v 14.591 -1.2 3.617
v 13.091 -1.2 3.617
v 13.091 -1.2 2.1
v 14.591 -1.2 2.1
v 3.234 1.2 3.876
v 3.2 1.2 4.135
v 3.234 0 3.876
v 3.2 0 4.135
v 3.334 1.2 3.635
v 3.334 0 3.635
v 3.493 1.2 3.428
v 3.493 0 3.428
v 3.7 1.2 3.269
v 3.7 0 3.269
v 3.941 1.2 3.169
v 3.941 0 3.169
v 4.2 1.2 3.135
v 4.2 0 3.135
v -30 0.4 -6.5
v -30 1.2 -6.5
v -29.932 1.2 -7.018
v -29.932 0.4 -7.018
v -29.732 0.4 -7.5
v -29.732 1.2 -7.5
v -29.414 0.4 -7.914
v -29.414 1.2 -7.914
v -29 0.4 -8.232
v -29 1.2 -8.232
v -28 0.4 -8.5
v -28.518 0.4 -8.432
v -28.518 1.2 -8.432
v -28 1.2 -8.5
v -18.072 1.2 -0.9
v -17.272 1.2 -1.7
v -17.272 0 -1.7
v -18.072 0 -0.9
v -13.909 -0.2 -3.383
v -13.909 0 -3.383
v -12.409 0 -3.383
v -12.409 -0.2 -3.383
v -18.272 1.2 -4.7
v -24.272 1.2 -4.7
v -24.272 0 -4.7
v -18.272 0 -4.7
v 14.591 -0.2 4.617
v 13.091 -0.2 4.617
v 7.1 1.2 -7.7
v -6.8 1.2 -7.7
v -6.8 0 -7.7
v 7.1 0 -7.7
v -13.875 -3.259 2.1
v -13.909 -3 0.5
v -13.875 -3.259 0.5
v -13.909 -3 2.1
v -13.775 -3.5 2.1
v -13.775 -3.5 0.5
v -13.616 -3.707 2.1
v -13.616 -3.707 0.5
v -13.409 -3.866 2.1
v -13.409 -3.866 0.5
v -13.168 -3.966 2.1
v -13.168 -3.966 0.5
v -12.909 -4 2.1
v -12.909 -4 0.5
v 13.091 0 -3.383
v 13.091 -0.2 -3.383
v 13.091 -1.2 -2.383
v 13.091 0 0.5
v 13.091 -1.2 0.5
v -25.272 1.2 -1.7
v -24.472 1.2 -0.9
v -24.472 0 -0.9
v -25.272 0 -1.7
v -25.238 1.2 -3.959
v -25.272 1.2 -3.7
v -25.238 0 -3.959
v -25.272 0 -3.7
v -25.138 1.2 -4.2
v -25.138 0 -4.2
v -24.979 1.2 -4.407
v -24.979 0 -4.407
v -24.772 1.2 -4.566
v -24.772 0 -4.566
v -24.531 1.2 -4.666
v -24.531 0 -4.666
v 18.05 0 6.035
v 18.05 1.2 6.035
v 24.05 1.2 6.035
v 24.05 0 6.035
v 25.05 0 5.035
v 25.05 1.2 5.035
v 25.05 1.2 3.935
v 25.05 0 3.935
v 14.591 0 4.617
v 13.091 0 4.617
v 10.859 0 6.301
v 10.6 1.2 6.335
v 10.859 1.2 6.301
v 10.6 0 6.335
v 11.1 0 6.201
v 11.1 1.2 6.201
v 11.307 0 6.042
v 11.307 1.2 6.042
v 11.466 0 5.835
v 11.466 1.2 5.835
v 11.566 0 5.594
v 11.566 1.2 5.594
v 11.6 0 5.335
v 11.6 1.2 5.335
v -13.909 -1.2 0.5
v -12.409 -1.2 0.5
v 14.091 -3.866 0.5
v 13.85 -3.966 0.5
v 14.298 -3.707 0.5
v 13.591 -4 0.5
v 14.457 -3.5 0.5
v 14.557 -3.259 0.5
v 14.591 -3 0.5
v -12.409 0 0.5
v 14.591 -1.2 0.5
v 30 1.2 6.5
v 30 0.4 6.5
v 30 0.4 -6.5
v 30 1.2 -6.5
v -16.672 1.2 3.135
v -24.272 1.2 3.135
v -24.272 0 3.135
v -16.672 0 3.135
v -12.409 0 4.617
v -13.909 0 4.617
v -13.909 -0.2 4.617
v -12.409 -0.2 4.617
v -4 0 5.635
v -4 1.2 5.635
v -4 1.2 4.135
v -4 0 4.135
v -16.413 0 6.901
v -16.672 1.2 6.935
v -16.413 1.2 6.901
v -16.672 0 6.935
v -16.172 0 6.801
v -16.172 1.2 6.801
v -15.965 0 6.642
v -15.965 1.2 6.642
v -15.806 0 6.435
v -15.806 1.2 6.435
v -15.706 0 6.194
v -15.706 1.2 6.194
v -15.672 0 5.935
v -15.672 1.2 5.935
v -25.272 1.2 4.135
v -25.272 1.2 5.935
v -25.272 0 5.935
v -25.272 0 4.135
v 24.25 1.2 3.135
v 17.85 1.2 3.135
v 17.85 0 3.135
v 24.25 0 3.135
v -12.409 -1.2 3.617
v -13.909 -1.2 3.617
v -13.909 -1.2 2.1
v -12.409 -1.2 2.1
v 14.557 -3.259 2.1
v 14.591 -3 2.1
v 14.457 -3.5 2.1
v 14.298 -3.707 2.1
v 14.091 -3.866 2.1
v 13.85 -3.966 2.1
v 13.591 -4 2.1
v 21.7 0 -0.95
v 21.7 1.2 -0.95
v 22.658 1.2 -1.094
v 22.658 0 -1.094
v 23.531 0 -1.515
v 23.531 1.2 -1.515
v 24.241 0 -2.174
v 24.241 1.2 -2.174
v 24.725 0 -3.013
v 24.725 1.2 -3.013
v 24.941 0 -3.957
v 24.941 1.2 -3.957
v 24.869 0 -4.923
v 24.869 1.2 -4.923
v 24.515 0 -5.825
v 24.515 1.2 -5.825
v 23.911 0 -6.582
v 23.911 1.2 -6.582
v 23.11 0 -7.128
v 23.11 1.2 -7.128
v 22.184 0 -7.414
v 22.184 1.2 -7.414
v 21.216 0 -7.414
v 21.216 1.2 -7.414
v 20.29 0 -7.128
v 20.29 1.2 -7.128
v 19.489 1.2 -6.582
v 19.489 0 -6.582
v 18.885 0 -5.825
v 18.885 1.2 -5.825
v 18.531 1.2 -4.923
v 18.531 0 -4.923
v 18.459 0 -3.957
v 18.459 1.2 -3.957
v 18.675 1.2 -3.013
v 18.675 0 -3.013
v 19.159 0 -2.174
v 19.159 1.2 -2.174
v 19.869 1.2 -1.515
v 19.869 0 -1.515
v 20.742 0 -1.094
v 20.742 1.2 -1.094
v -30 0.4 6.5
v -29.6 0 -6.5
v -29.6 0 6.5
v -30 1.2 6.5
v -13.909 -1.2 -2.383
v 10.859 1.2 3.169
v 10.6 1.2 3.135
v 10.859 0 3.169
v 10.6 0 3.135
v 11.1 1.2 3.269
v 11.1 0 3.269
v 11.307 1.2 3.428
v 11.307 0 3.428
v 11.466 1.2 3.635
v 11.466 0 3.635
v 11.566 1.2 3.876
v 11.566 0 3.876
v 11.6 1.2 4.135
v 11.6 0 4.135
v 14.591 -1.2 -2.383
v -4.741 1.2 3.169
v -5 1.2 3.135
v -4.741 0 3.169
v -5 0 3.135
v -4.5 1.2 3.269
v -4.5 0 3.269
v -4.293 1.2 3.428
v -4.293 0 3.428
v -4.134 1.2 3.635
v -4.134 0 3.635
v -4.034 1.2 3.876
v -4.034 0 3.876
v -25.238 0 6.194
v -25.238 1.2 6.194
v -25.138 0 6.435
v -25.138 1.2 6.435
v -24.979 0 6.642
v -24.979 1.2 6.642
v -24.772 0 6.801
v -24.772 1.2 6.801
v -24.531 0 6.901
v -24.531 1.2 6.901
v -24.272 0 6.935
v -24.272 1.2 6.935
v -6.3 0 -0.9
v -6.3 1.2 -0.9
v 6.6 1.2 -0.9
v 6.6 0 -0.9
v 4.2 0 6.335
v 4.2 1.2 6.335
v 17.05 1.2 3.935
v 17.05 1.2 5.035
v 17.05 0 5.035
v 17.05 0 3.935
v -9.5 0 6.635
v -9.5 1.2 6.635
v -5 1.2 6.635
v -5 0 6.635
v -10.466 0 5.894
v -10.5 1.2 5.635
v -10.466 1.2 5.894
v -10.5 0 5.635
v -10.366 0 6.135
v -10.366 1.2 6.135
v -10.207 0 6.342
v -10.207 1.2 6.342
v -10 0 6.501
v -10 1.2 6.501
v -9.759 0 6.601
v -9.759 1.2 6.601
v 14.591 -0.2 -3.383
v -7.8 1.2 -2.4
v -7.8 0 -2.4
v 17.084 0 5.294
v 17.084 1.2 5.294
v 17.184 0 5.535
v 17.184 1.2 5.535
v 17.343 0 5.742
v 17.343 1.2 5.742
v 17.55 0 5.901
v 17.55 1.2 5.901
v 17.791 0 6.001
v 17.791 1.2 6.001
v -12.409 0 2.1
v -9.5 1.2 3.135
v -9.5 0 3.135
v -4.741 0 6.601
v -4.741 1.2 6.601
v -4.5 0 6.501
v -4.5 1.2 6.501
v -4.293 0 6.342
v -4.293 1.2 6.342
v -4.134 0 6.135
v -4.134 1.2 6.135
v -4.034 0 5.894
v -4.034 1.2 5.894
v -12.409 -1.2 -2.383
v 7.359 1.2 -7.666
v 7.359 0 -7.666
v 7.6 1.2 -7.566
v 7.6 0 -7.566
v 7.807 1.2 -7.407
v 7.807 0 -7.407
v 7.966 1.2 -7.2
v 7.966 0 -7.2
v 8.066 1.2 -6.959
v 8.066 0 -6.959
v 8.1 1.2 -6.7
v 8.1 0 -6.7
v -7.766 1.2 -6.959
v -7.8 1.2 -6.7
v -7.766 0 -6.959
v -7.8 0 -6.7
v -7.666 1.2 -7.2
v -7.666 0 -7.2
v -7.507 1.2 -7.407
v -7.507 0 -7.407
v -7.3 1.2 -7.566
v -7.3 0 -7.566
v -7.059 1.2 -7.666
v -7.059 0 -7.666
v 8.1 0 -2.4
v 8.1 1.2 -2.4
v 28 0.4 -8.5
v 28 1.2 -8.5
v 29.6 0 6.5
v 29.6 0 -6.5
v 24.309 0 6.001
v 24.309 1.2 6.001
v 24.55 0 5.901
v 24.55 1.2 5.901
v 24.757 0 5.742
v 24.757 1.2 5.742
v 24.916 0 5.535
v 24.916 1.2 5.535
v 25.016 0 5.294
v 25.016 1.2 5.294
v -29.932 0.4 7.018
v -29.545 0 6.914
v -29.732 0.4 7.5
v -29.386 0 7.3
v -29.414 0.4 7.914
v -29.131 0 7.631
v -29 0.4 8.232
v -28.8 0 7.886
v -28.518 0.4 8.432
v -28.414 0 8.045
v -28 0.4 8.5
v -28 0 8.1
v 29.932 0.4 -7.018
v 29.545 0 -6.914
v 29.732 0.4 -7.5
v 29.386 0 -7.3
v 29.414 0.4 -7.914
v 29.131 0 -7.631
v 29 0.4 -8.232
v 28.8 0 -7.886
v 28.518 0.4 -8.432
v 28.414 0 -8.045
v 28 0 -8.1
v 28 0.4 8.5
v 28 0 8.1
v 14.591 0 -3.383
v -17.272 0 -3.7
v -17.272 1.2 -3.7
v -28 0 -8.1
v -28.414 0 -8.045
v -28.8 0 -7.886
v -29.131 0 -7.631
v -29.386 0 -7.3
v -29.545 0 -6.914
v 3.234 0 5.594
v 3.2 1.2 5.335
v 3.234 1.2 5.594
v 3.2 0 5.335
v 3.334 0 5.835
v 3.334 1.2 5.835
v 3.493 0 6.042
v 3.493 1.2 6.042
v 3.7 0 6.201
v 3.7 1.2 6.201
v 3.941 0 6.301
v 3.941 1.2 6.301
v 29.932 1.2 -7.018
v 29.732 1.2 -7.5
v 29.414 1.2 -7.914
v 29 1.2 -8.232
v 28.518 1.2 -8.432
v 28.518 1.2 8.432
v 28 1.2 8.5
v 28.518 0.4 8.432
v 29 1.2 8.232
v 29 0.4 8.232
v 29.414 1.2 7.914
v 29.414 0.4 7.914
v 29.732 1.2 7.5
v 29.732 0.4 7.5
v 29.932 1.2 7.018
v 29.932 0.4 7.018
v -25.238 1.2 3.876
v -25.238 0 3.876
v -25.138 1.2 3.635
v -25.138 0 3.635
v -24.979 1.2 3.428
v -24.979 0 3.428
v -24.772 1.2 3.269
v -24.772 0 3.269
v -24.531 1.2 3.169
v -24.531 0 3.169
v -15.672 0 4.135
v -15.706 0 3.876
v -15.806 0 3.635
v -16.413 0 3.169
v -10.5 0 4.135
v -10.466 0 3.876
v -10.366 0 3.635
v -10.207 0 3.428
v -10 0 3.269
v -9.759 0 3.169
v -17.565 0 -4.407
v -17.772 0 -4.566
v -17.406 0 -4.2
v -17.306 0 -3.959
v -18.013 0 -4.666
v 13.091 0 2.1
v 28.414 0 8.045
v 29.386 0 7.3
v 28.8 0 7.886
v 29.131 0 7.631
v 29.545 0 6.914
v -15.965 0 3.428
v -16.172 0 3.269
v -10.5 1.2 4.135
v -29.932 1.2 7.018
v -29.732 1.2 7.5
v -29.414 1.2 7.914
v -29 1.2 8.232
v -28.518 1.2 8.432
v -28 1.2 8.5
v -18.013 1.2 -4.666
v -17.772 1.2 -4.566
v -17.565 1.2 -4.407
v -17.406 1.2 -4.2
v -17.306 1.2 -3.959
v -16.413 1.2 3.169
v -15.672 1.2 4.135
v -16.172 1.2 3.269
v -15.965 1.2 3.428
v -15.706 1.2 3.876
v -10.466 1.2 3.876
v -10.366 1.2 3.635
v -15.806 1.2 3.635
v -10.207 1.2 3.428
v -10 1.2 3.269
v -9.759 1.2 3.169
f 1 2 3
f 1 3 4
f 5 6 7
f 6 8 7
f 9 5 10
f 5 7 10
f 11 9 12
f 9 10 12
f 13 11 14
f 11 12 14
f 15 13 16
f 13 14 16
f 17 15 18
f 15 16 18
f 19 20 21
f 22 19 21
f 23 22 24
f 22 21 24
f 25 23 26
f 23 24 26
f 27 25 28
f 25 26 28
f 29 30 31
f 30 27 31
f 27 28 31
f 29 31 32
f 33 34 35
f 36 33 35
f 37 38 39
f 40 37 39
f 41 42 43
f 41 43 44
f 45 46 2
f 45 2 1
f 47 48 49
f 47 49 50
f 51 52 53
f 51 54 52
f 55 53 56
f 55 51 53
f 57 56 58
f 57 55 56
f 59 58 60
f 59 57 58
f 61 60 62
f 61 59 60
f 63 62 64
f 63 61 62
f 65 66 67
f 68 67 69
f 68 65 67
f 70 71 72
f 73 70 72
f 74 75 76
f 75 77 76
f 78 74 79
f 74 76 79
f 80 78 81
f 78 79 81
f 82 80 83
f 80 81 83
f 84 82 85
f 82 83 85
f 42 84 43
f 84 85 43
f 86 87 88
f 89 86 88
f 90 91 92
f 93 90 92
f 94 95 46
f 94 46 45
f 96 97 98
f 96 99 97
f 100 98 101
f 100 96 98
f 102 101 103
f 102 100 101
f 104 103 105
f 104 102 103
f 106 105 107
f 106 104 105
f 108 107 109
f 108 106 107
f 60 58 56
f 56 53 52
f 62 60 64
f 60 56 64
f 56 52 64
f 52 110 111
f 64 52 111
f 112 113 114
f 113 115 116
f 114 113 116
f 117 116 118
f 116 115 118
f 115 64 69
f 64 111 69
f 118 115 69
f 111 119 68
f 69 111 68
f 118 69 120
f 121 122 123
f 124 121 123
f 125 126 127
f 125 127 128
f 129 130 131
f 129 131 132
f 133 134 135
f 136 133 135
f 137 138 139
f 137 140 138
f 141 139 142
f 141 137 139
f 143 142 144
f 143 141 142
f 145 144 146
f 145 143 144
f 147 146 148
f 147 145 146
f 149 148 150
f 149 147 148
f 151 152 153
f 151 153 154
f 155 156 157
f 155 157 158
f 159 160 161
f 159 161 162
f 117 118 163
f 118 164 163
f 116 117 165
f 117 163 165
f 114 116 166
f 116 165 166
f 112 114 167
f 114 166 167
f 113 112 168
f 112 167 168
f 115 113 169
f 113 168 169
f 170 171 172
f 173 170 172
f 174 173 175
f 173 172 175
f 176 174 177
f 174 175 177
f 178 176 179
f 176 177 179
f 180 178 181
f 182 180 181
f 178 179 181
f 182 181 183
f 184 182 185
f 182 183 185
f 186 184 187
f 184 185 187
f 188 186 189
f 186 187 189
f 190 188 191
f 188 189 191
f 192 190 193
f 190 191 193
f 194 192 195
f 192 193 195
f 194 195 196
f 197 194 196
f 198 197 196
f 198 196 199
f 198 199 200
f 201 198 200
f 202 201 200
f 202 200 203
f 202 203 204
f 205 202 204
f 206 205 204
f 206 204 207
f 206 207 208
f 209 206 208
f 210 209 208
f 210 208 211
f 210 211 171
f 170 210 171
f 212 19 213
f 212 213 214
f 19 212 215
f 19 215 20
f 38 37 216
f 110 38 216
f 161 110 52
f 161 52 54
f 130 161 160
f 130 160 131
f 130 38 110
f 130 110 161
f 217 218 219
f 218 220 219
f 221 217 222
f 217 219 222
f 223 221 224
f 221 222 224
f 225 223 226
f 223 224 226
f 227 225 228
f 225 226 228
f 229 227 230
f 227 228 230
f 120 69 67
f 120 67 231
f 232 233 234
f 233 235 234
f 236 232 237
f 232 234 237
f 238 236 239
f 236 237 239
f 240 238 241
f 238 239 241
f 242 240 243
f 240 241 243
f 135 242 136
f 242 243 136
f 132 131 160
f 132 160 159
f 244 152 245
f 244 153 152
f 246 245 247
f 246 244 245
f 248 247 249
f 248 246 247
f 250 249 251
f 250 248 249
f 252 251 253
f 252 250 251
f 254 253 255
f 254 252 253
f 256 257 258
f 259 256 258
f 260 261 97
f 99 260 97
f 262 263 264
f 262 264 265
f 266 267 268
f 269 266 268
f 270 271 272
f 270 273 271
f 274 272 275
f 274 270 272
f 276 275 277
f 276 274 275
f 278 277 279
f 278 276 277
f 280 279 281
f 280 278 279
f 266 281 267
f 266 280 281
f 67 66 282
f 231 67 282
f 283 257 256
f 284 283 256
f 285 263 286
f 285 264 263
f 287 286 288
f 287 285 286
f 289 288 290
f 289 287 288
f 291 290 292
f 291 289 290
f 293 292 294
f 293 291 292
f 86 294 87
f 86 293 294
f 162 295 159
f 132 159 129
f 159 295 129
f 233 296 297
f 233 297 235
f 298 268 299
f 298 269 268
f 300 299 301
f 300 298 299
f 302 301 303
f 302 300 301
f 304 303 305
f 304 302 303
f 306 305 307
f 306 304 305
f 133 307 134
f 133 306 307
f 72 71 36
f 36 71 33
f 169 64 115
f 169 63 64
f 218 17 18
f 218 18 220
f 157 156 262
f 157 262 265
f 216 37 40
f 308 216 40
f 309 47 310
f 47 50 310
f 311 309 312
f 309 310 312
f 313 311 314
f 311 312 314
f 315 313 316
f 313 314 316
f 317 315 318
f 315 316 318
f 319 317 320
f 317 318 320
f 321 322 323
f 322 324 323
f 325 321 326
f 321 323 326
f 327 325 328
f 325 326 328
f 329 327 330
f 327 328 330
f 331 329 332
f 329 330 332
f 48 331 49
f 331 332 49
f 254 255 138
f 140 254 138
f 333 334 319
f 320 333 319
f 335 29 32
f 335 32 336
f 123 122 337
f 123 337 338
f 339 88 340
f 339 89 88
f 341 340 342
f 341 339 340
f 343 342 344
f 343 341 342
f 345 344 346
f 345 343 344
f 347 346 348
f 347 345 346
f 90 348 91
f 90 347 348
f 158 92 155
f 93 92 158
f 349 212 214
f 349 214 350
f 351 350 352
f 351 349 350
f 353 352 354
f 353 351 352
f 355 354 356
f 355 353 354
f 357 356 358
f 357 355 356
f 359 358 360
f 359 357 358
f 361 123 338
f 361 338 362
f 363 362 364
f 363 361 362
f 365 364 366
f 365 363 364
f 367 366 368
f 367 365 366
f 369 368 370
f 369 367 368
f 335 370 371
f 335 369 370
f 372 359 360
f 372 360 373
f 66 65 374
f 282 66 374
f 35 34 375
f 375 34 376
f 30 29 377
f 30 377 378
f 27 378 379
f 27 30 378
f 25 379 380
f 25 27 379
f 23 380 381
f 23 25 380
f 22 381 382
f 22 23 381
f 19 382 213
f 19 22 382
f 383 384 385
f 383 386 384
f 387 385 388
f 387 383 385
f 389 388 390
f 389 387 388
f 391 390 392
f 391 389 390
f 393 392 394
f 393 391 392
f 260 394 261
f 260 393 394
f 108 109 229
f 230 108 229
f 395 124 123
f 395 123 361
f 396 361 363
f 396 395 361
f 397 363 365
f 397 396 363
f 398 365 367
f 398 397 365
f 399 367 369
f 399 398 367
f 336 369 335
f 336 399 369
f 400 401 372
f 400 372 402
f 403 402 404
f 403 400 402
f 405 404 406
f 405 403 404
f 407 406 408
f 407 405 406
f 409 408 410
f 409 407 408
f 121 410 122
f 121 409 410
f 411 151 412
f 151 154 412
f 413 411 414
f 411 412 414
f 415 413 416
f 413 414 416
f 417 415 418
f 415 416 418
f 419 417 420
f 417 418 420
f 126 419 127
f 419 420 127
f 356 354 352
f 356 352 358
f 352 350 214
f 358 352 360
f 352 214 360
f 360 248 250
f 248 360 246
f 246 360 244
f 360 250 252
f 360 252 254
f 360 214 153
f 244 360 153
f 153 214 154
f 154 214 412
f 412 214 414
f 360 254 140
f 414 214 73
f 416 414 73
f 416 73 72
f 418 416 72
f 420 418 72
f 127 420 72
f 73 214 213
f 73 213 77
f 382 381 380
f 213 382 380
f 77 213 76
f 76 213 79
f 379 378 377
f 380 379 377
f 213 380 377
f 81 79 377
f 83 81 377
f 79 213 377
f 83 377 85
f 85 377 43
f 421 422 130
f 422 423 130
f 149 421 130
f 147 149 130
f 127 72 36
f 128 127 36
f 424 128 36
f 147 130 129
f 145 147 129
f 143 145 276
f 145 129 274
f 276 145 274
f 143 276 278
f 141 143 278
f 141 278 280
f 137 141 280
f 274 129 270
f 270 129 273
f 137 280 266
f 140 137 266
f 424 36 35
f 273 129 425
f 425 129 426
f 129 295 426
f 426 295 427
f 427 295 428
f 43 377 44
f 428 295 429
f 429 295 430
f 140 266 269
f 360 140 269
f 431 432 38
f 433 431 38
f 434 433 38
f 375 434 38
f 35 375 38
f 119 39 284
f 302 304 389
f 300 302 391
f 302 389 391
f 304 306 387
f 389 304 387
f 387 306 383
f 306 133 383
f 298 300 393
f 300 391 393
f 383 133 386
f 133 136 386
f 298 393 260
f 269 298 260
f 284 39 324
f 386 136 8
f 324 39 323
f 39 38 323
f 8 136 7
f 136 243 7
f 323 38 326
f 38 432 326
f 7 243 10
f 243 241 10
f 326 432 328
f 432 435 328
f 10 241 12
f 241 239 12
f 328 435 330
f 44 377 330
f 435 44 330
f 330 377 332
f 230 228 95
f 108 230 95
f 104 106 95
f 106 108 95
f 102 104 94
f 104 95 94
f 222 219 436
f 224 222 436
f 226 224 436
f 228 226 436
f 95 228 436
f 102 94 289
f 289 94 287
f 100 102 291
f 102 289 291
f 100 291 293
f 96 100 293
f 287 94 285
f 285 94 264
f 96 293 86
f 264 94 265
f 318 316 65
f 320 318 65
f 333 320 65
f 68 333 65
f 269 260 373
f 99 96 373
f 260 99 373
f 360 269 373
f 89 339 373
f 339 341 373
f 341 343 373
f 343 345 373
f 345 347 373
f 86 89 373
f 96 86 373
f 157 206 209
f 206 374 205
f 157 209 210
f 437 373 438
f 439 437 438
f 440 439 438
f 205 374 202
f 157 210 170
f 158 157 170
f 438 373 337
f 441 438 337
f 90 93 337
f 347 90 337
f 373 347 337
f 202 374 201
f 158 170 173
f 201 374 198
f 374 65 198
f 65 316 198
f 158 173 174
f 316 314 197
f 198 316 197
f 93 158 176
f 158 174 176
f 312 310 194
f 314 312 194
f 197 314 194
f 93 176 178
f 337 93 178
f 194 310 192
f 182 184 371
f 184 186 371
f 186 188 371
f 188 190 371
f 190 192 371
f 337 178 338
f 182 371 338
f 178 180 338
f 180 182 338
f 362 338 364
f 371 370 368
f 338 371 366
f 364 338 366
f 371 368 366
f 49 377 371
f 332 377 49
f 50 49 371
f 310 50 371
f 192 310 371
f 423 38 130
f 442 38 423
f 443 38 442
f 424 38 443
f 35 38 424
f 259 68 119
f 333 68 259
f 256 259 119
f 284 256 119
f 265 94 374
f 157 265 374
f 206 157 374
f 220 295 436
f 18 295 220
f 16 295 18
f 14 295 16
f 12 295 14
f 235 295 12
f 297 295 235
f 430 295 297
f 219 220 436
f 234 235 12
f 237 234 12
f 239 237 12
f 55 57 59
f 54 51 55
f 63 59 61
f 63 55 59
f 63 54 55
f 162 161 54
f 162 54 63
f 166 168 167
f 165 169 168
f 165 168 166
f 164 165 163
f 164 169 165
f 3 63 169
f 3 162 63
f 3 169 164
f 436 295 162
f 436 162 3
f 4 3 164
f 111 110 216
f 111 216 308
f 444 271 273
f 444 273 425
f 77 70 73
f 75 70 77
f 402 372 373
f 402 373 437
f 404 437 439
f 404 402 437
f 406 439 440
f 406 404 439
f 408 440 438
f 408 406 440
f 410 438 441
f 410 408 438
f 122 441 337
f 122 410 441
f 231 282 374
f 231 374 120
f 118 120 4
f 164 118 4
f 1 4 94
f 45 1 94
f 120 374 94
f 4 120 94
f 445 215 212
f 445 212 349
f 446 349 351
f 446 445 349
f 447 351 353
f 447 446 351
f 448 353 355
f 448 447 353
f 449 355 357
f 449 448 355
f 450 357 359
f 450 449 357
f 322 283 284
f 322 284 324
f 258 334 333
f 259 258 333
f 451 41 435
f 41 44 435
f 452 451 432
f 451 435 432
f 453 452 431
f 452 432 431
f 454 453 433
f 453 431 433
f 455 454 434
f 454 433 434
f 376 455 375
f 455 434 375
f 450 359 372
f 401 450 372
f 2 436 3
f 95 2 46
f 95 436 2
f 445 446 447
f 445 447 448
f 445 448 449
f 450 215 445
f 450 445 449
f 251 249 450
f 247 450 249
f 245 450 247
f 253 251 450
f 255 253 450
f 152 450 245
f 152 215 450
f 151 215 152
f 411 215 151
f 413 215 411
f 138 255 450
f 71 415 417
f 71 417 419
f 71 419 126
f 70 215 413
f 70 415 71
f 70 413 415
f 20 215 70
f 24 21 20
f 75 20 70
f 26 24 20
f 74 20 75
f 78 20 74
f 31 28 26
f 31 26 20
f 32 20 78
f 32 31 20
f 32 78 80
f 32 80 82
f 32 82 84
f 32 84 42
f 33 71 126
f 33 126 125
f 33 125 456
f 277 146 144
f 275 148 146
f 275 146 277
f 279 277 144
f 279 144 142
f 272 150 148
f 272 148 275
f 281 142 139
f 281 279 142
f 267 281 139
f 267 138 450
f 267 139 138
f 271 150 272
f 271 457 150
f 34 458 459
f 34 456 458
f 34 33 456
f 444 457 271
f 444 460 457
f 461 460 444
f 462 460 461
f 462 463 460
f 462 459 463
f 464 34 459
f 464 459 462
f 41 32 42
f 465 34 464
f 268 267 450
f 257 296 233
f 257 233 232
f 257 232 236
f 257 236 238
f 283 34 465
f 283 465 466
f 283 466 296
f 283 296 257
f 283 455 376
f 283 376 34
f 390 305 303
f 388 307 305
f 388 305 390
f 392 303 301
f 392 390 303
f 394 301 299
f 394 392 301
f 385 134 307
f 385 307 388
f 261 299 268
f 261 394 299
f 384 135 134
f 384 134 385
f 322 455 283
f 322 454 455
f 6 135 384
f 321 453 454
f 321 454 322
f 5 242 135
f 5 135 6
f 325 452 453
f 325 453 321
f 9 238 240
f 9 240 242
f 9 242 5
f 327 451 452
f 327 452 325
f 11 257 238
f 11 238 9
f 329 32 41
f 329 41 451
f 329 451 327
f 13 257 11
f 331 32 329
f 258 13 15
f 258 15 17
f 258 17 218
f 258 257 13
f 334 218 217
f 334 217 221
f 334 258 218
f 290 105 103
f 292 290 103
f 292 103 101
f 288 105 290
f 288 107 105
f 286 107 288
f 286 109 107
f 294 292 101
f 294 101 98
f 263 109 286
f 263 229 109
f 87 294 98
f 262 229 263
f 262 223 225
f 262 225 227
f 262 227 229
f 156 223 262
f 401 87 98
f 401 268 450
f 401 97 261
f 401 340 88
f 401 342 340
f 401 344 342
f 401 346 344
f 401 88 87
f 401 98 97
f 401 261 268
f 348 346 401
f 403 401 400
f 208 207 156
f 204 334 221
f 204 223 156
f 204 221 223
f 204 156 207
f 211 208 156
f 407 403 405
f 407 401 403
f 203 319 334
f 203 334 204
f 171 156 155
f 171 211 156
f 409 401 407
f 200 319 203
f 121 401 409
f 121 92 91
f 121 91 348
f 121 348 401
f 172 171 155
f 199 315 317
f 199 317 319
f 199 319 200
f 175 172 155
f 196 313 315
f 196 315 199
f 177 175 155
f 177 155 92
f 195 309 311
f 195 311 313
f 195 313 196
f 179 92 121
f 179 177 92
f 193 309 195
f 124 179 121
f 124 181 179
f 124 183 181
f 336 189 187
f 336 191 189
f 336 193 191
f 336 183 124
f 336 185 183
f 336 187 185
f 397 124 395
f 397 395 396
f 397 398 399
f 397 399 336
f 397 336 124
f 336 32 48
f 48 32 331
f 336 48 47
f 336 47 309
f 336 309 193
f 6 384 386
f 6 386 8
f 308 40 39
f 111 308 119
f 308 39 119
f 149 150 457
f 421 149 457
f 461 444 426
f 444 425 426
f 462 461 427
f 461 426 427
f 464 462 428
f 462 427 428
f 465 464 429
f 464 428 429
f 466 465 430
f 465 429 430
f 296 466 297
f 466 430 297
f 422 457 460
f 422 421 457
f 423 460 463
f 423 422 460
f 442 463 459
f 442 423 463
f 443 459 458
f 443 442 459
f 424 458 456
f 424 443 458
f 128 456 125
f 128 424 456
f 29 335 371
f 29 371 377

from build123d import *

# Parameters (mm, degrees)
SKETCH_1_W          = 60
SKETCH_1_H          = 17
EXTRUDE_1_DEPTH     = 1.2
CUT_EXTRUDE_1_REACH = 33.204
SKETCH_4_R          = 3.25
SKETCH_4_W          = 8
SKETCH_4_H          = 3.8
SKETCH_4_W_2        = 15.9
SKETCH_4_H_2        = 6.8
SKETCH_4_H_3        = 2.9
SKETCH_4_W_3        = 8.4
SKETCH_4_H_4        = 3.2
SKETCH_4_W_4        = 6.5
SKETCH_4_H_5        = 3.5
SKETCH_4_W_5        = 9.6
FILLET_2_R          = 1
CHAMFER_1_SIZE      = 0.8
SKETCH_5_W          = 1.5
SKETCH_5_H          = 8
EXTRUDE_2_DEPTH     = 1.2
SKETCH_6_W          = 28.5
SKETCH_6_H          = 1.6
EXTRUDE_3_DEPTH     = 4
FILLET_3_R          = 1
CHAMFER_2_SIZE      = 1
FILLET_4_R          = 2
CHAMFER_5_SIZE      = 0.4
CHAMFER_6_SIZE      = 1.5


with BuildPart() as part:
    # 草图1 → 凸台-拉伸1 (new body)
    with BuildSketch(Plane(origin=(0, 0, 0), x_dir=(1, 0, 0), z_dir=(0, 1, 0))):
        Rectangle(SKETCH_1_W, SKETCH_1_H)
    extrude(amount=EXTRUDE_1_DEPTH)

    # 草图4 → 切除-拉伸1 (cut, up to next)
    with BuildSketch(Plane(origin=(0, 1.2, 0), x_dir=(1, 0, 0), z_dir=(0, 1, 0)), mode=Mode.PRIVATE) as cut_extrude_1_sk1:
        with Locations(Location((21.7, 4.2, 0), (0, 0, 270))):
            Circle(SKETCH_4_R)
    cut_extrude_1_tool1 = extrude(cut_extrude_1_sk1.sketch, amount=-CUT_EXTRUDE_1_REACH, mode=Mode.PRIVATE) & part.part
    # 草图4 → 切除-拉伸1 (cut, up to next)
    with BuildSketch(Plane(origin=(0, 1.2, 0), x_dir=(1, 0, 0), z_dir=(0, 1, 0)), mode=Mode.PRIVATE) as cut_extrude_1_sk2:
        with Locations((-21.271722325, 2.8)):
            Rectangle(SKETCH_4_W, SKETCH_4_H)
    cut_extrude_1_tool2 = extrude(cut_extrude_1_sk2.sketch, amount=-CUT_EXTRUDE_1_REACH, mode=Mode.PRIVATE) & part.part
    # 草图4 → 切除-拉伸1 (cut, up to next)
    with BuildSketch(Plane(origin=(0, 1.2, 0), x_dir=(1, 0, 0), z_dir=(0, 1, 0)), mode=Mode.PRIVATE) as cut_extrude_1_sk3:
        with Locations((0.15, 4.3)):
            Rectangle(SKETCH_4_W_2, SKETCH_4_H_2)
    cut_extrude_1_tool3 = extrude(cut_extrude_1_sk3.sketch, amount=-CUT_EXTRUDE_1_REACH, mode=Mode.PRIVATE) & part.part
    # 草图4 → 切除-拉伸1 (cut, up to next)
    with BuildSketch(Plane(origin=(0, 1.2, 0), x_dir=(1, 0, 0), z_dir=(0, 1, 0)), mode=Mode.PRIVATE) as cut_extrude_1_sk4:
        with Locations((21.05, -4.584803861)):
            Rectangle(SKETCH_4_W, SKETCH_4_H_3)
    cut_extrude_1_tool4 = extrude(cut_extrude_1_sk4.sketch, amount=-CUT_EXTRUDE_1_REACH, mode=Mode.PRIVATE) & part.part
    # 草图4 → 切除-拉伸1 (cut, up to next)
    with BuildSketch(Plane(origin=(0, 1.2, 0), x_dir=(1, 0, 0), z_dir=(0, 1, 0)), mode=Mode.PRIVATE) as cut_extrude_1_sk5:
        with Locations((7.4, -4.734803861)):
            Rectangle(SKETCH_4_W_3, SKETCH_4_H_4)
    cut_extrude_1_tool5 = extrude(cut_extrude_1_sk5.sketch, amount=-CUT_EXTRUDE_1_REACH, mode=Mode.PRIVATE) & part.part
    # 草图4 → 切除-拉伸1 (cut, up to next)
    with BuildSketch(Plane(origin=(0, 1.2, 0), x_dir=(1, 0, 0), z_dir=(0, 1, 0)), mode=Mode.PRIVATE) as cut_extrude_1_sk6:
        with Locations((-7.25, -4.884803861)):
            Rectangle(SKETCH_4_W_4, SKETCH_4_H_5)
    cut_extrude_1_tool6 = extrude(cut_extrude_1_sk6.sketch, amount=-CUT_EXTRUDE_1_REACH, mode=Mode.PRIVATE) & part.part
    # 草图4 → 切除-拉伸1 (cut, up to next)
    with BuildSketch(Plane(origin=(0, 1.2, 0), x_dir=(1, 0, 0), z_dir=(0, 1, 0)), mode=Mode.PRIVATE) as cut_extrude_1_sk7:
        with Locations((-20.471722325, -5.034803861)):
            Rectangle(SKETCH_4_W_5, SKETCH_4_H)
    cut_extrude_1_tool7 = extrude(cut_extrude_1_sk7.sketch, amount=-CUT_EXTRUDE_1_REACH, mode=Mode.PRIVATE) & part.part
    add(cut_extrude_1_tool1.solids().sort_by_distance((21.7, 1.2, -4.2))[0], mode=Mode.SUBTRACT)
    add(cut_extrude_1_tool2.solids().sort_by_distance((-21.271722, 1.2, -2.8))[0], mode=Mode.SUBTRACT)
    add(cut_extrude_1_tool3.solids().sort_by_distance((0.15, 1.2, -4.3))[0], mode=Mode.SUBTRACT)
    add(cut_extrude_1_tool4.solids().sort_by_distance((21.05, 1.2, 4.584804))[0], mode=Mode.SUBTRACT)
    add(cut_extrude_1_tool5.solids().sort_by_distance((7.4, 1.2, 4.734804))[0], mode=Mode.SUBTRACT)
    add(cut_extrude_1_tool6.solids().sort_by_distance((-7.25, 1.2, 4.884804))[0], mode=Mode.SUBTRACT)
    add(cut_extrude_1_tool7.solids().sort_by_distance((-20.471722, 1.2, 5.034804))[0], mode=Mode.SUBTRACT)

    # 圆角2
    fillet_2_edges = [part.edges().sort_by_distance(p)[0] for p in [
        (-10.5, 0.6, 6.634803861),
        (-10.5, 0.6, 3.134803861),
        (-4, 0.6, 3.134803861),
        (-4, 0.6, 6.634803861),
        (3.2, 0.6, 6.334803861),
        (3.2, 0.6, 3.134803861),
        (11.6, 0.6, 3.134803861),
        (11.6, 0.6, 6.334803861),
        (17.05, 0.6, 6.034803861),
        (25.05, 0.6, 6.034803861),
        (-7.8, 0.6, -7.7),
        (8.1, 0.6, -7.7),
        (-25.271722325, 0.6, 6.934803861),
        (-25.271722325, 0.6, 3.134803861),
        (-15.671722325, 0.6, 3.134803861),
        (-15.671722325, 0.6, 6.934803861),
        (-25.271722325, 0.6, -4.7),
        (-17.271722325, 0.6, -4.7),
    ]]
    fillet(fillet_2_edges, radius=FILLET_2_R)

    # 倒角1
    chamfer_1_edges = [part.edges().sort_by_distance(p)[0] for p in [
        (17.05, 0.6, 3.134803861),
        (25.05, 0.6, 3.134803861),
        (-25.271722325, 0.6, -0.9),
        (-17.271722325, 0.6, -0.9),
    ]]
    chamfer(chamfer_1_edges, length=CHAMFER_1_SIZE)

    # 草图5 → 凸台-拉伸2 (add)
    with BuildSketch(Plane.XZ):
        with Locations((-13.15891381, 0.61681071)):
            Rectangle(SKETCH_5_W, SKETCH_5_H)
        with Locations((13.84108619, 0.61681071)):
            Rectangle(SKETCH_5_W, SKETCH_5_H)
    extrude(amount=EXTRUDE_2_DEPTH)

    # 草图6 → 凸台-拉伸3 (add)
    with BuildSketch(Plane.XZ):
        with Locations((0.34108619, 1.3)):
            Rectangle(SKETCH_6_W, SKETCH_6_H)
    extrude(amount=EXTRUDE_3_DEPTH)

    # 圆角3
    fillet_3_edges = [part.edges().sort_by_distance(p)[0] for p in [
        (-13.90891381, -4, 1.3),
        (14.59108619, -4, 1.3),
    ]]
    fillet(fillet_3_edges, radius=FILLET_3_R)

    # 倒角2
    chamfer_2_edges = [part.edges().sort_by_distance(p)[0] for p in [
        (-13.15891381, -1.2, -3.38318929),
        (-13.15891381, -1.2, 4.61681071),
        (13.84108619, -1.2, -3.38318929),
        (13.84108619, -1.2, 4.61681071),
    ]]
    chamfer(chamfer_2_edges, length=CHAMFER_2_SIZE)

    # 圆角4
    fillet_4_edges = [part.edges().sort_by_distance(p)[0] for p in [
        (30, 0.6, 8.5),
        (-30, 0.6, 8.5),
        (-30, 0.6, -8.5),
        (30, 0.6, -8.5),
    ]]
    fillet(fillet_4_edges, radius=FILLET_4_R)

    # 倒角5
    chamfer_5_edges = [part.edges().sort_by_distance(p)[0] for p in [
        (30, 0, 0),
        (0, 0, 8.5),
        (-30, 0, 0),
        (0, 0, -8.5),
        (-29.414213562, 0, -7.914213562),
        (-29.414213562, 0, 7.914213562),
        (29.414213562, 0, -7.914213562),
        (29.414213562, 0, 7.914213562),
    ]]
    chamfer(chamfer_5_edges, length=CHAMFER_5_SIZE)

    # 倒角6
    chamfer_6_edges = [part.edges().sort_by_distance(p)[0] for p in [
        (-7.8, 0.6, -0.9),
        (8.1, 0.6, -0.9),
    ]]
    chamfer(chamfer_6_edges, length=CHAMFER_6_SIZE)


solid = part.part
